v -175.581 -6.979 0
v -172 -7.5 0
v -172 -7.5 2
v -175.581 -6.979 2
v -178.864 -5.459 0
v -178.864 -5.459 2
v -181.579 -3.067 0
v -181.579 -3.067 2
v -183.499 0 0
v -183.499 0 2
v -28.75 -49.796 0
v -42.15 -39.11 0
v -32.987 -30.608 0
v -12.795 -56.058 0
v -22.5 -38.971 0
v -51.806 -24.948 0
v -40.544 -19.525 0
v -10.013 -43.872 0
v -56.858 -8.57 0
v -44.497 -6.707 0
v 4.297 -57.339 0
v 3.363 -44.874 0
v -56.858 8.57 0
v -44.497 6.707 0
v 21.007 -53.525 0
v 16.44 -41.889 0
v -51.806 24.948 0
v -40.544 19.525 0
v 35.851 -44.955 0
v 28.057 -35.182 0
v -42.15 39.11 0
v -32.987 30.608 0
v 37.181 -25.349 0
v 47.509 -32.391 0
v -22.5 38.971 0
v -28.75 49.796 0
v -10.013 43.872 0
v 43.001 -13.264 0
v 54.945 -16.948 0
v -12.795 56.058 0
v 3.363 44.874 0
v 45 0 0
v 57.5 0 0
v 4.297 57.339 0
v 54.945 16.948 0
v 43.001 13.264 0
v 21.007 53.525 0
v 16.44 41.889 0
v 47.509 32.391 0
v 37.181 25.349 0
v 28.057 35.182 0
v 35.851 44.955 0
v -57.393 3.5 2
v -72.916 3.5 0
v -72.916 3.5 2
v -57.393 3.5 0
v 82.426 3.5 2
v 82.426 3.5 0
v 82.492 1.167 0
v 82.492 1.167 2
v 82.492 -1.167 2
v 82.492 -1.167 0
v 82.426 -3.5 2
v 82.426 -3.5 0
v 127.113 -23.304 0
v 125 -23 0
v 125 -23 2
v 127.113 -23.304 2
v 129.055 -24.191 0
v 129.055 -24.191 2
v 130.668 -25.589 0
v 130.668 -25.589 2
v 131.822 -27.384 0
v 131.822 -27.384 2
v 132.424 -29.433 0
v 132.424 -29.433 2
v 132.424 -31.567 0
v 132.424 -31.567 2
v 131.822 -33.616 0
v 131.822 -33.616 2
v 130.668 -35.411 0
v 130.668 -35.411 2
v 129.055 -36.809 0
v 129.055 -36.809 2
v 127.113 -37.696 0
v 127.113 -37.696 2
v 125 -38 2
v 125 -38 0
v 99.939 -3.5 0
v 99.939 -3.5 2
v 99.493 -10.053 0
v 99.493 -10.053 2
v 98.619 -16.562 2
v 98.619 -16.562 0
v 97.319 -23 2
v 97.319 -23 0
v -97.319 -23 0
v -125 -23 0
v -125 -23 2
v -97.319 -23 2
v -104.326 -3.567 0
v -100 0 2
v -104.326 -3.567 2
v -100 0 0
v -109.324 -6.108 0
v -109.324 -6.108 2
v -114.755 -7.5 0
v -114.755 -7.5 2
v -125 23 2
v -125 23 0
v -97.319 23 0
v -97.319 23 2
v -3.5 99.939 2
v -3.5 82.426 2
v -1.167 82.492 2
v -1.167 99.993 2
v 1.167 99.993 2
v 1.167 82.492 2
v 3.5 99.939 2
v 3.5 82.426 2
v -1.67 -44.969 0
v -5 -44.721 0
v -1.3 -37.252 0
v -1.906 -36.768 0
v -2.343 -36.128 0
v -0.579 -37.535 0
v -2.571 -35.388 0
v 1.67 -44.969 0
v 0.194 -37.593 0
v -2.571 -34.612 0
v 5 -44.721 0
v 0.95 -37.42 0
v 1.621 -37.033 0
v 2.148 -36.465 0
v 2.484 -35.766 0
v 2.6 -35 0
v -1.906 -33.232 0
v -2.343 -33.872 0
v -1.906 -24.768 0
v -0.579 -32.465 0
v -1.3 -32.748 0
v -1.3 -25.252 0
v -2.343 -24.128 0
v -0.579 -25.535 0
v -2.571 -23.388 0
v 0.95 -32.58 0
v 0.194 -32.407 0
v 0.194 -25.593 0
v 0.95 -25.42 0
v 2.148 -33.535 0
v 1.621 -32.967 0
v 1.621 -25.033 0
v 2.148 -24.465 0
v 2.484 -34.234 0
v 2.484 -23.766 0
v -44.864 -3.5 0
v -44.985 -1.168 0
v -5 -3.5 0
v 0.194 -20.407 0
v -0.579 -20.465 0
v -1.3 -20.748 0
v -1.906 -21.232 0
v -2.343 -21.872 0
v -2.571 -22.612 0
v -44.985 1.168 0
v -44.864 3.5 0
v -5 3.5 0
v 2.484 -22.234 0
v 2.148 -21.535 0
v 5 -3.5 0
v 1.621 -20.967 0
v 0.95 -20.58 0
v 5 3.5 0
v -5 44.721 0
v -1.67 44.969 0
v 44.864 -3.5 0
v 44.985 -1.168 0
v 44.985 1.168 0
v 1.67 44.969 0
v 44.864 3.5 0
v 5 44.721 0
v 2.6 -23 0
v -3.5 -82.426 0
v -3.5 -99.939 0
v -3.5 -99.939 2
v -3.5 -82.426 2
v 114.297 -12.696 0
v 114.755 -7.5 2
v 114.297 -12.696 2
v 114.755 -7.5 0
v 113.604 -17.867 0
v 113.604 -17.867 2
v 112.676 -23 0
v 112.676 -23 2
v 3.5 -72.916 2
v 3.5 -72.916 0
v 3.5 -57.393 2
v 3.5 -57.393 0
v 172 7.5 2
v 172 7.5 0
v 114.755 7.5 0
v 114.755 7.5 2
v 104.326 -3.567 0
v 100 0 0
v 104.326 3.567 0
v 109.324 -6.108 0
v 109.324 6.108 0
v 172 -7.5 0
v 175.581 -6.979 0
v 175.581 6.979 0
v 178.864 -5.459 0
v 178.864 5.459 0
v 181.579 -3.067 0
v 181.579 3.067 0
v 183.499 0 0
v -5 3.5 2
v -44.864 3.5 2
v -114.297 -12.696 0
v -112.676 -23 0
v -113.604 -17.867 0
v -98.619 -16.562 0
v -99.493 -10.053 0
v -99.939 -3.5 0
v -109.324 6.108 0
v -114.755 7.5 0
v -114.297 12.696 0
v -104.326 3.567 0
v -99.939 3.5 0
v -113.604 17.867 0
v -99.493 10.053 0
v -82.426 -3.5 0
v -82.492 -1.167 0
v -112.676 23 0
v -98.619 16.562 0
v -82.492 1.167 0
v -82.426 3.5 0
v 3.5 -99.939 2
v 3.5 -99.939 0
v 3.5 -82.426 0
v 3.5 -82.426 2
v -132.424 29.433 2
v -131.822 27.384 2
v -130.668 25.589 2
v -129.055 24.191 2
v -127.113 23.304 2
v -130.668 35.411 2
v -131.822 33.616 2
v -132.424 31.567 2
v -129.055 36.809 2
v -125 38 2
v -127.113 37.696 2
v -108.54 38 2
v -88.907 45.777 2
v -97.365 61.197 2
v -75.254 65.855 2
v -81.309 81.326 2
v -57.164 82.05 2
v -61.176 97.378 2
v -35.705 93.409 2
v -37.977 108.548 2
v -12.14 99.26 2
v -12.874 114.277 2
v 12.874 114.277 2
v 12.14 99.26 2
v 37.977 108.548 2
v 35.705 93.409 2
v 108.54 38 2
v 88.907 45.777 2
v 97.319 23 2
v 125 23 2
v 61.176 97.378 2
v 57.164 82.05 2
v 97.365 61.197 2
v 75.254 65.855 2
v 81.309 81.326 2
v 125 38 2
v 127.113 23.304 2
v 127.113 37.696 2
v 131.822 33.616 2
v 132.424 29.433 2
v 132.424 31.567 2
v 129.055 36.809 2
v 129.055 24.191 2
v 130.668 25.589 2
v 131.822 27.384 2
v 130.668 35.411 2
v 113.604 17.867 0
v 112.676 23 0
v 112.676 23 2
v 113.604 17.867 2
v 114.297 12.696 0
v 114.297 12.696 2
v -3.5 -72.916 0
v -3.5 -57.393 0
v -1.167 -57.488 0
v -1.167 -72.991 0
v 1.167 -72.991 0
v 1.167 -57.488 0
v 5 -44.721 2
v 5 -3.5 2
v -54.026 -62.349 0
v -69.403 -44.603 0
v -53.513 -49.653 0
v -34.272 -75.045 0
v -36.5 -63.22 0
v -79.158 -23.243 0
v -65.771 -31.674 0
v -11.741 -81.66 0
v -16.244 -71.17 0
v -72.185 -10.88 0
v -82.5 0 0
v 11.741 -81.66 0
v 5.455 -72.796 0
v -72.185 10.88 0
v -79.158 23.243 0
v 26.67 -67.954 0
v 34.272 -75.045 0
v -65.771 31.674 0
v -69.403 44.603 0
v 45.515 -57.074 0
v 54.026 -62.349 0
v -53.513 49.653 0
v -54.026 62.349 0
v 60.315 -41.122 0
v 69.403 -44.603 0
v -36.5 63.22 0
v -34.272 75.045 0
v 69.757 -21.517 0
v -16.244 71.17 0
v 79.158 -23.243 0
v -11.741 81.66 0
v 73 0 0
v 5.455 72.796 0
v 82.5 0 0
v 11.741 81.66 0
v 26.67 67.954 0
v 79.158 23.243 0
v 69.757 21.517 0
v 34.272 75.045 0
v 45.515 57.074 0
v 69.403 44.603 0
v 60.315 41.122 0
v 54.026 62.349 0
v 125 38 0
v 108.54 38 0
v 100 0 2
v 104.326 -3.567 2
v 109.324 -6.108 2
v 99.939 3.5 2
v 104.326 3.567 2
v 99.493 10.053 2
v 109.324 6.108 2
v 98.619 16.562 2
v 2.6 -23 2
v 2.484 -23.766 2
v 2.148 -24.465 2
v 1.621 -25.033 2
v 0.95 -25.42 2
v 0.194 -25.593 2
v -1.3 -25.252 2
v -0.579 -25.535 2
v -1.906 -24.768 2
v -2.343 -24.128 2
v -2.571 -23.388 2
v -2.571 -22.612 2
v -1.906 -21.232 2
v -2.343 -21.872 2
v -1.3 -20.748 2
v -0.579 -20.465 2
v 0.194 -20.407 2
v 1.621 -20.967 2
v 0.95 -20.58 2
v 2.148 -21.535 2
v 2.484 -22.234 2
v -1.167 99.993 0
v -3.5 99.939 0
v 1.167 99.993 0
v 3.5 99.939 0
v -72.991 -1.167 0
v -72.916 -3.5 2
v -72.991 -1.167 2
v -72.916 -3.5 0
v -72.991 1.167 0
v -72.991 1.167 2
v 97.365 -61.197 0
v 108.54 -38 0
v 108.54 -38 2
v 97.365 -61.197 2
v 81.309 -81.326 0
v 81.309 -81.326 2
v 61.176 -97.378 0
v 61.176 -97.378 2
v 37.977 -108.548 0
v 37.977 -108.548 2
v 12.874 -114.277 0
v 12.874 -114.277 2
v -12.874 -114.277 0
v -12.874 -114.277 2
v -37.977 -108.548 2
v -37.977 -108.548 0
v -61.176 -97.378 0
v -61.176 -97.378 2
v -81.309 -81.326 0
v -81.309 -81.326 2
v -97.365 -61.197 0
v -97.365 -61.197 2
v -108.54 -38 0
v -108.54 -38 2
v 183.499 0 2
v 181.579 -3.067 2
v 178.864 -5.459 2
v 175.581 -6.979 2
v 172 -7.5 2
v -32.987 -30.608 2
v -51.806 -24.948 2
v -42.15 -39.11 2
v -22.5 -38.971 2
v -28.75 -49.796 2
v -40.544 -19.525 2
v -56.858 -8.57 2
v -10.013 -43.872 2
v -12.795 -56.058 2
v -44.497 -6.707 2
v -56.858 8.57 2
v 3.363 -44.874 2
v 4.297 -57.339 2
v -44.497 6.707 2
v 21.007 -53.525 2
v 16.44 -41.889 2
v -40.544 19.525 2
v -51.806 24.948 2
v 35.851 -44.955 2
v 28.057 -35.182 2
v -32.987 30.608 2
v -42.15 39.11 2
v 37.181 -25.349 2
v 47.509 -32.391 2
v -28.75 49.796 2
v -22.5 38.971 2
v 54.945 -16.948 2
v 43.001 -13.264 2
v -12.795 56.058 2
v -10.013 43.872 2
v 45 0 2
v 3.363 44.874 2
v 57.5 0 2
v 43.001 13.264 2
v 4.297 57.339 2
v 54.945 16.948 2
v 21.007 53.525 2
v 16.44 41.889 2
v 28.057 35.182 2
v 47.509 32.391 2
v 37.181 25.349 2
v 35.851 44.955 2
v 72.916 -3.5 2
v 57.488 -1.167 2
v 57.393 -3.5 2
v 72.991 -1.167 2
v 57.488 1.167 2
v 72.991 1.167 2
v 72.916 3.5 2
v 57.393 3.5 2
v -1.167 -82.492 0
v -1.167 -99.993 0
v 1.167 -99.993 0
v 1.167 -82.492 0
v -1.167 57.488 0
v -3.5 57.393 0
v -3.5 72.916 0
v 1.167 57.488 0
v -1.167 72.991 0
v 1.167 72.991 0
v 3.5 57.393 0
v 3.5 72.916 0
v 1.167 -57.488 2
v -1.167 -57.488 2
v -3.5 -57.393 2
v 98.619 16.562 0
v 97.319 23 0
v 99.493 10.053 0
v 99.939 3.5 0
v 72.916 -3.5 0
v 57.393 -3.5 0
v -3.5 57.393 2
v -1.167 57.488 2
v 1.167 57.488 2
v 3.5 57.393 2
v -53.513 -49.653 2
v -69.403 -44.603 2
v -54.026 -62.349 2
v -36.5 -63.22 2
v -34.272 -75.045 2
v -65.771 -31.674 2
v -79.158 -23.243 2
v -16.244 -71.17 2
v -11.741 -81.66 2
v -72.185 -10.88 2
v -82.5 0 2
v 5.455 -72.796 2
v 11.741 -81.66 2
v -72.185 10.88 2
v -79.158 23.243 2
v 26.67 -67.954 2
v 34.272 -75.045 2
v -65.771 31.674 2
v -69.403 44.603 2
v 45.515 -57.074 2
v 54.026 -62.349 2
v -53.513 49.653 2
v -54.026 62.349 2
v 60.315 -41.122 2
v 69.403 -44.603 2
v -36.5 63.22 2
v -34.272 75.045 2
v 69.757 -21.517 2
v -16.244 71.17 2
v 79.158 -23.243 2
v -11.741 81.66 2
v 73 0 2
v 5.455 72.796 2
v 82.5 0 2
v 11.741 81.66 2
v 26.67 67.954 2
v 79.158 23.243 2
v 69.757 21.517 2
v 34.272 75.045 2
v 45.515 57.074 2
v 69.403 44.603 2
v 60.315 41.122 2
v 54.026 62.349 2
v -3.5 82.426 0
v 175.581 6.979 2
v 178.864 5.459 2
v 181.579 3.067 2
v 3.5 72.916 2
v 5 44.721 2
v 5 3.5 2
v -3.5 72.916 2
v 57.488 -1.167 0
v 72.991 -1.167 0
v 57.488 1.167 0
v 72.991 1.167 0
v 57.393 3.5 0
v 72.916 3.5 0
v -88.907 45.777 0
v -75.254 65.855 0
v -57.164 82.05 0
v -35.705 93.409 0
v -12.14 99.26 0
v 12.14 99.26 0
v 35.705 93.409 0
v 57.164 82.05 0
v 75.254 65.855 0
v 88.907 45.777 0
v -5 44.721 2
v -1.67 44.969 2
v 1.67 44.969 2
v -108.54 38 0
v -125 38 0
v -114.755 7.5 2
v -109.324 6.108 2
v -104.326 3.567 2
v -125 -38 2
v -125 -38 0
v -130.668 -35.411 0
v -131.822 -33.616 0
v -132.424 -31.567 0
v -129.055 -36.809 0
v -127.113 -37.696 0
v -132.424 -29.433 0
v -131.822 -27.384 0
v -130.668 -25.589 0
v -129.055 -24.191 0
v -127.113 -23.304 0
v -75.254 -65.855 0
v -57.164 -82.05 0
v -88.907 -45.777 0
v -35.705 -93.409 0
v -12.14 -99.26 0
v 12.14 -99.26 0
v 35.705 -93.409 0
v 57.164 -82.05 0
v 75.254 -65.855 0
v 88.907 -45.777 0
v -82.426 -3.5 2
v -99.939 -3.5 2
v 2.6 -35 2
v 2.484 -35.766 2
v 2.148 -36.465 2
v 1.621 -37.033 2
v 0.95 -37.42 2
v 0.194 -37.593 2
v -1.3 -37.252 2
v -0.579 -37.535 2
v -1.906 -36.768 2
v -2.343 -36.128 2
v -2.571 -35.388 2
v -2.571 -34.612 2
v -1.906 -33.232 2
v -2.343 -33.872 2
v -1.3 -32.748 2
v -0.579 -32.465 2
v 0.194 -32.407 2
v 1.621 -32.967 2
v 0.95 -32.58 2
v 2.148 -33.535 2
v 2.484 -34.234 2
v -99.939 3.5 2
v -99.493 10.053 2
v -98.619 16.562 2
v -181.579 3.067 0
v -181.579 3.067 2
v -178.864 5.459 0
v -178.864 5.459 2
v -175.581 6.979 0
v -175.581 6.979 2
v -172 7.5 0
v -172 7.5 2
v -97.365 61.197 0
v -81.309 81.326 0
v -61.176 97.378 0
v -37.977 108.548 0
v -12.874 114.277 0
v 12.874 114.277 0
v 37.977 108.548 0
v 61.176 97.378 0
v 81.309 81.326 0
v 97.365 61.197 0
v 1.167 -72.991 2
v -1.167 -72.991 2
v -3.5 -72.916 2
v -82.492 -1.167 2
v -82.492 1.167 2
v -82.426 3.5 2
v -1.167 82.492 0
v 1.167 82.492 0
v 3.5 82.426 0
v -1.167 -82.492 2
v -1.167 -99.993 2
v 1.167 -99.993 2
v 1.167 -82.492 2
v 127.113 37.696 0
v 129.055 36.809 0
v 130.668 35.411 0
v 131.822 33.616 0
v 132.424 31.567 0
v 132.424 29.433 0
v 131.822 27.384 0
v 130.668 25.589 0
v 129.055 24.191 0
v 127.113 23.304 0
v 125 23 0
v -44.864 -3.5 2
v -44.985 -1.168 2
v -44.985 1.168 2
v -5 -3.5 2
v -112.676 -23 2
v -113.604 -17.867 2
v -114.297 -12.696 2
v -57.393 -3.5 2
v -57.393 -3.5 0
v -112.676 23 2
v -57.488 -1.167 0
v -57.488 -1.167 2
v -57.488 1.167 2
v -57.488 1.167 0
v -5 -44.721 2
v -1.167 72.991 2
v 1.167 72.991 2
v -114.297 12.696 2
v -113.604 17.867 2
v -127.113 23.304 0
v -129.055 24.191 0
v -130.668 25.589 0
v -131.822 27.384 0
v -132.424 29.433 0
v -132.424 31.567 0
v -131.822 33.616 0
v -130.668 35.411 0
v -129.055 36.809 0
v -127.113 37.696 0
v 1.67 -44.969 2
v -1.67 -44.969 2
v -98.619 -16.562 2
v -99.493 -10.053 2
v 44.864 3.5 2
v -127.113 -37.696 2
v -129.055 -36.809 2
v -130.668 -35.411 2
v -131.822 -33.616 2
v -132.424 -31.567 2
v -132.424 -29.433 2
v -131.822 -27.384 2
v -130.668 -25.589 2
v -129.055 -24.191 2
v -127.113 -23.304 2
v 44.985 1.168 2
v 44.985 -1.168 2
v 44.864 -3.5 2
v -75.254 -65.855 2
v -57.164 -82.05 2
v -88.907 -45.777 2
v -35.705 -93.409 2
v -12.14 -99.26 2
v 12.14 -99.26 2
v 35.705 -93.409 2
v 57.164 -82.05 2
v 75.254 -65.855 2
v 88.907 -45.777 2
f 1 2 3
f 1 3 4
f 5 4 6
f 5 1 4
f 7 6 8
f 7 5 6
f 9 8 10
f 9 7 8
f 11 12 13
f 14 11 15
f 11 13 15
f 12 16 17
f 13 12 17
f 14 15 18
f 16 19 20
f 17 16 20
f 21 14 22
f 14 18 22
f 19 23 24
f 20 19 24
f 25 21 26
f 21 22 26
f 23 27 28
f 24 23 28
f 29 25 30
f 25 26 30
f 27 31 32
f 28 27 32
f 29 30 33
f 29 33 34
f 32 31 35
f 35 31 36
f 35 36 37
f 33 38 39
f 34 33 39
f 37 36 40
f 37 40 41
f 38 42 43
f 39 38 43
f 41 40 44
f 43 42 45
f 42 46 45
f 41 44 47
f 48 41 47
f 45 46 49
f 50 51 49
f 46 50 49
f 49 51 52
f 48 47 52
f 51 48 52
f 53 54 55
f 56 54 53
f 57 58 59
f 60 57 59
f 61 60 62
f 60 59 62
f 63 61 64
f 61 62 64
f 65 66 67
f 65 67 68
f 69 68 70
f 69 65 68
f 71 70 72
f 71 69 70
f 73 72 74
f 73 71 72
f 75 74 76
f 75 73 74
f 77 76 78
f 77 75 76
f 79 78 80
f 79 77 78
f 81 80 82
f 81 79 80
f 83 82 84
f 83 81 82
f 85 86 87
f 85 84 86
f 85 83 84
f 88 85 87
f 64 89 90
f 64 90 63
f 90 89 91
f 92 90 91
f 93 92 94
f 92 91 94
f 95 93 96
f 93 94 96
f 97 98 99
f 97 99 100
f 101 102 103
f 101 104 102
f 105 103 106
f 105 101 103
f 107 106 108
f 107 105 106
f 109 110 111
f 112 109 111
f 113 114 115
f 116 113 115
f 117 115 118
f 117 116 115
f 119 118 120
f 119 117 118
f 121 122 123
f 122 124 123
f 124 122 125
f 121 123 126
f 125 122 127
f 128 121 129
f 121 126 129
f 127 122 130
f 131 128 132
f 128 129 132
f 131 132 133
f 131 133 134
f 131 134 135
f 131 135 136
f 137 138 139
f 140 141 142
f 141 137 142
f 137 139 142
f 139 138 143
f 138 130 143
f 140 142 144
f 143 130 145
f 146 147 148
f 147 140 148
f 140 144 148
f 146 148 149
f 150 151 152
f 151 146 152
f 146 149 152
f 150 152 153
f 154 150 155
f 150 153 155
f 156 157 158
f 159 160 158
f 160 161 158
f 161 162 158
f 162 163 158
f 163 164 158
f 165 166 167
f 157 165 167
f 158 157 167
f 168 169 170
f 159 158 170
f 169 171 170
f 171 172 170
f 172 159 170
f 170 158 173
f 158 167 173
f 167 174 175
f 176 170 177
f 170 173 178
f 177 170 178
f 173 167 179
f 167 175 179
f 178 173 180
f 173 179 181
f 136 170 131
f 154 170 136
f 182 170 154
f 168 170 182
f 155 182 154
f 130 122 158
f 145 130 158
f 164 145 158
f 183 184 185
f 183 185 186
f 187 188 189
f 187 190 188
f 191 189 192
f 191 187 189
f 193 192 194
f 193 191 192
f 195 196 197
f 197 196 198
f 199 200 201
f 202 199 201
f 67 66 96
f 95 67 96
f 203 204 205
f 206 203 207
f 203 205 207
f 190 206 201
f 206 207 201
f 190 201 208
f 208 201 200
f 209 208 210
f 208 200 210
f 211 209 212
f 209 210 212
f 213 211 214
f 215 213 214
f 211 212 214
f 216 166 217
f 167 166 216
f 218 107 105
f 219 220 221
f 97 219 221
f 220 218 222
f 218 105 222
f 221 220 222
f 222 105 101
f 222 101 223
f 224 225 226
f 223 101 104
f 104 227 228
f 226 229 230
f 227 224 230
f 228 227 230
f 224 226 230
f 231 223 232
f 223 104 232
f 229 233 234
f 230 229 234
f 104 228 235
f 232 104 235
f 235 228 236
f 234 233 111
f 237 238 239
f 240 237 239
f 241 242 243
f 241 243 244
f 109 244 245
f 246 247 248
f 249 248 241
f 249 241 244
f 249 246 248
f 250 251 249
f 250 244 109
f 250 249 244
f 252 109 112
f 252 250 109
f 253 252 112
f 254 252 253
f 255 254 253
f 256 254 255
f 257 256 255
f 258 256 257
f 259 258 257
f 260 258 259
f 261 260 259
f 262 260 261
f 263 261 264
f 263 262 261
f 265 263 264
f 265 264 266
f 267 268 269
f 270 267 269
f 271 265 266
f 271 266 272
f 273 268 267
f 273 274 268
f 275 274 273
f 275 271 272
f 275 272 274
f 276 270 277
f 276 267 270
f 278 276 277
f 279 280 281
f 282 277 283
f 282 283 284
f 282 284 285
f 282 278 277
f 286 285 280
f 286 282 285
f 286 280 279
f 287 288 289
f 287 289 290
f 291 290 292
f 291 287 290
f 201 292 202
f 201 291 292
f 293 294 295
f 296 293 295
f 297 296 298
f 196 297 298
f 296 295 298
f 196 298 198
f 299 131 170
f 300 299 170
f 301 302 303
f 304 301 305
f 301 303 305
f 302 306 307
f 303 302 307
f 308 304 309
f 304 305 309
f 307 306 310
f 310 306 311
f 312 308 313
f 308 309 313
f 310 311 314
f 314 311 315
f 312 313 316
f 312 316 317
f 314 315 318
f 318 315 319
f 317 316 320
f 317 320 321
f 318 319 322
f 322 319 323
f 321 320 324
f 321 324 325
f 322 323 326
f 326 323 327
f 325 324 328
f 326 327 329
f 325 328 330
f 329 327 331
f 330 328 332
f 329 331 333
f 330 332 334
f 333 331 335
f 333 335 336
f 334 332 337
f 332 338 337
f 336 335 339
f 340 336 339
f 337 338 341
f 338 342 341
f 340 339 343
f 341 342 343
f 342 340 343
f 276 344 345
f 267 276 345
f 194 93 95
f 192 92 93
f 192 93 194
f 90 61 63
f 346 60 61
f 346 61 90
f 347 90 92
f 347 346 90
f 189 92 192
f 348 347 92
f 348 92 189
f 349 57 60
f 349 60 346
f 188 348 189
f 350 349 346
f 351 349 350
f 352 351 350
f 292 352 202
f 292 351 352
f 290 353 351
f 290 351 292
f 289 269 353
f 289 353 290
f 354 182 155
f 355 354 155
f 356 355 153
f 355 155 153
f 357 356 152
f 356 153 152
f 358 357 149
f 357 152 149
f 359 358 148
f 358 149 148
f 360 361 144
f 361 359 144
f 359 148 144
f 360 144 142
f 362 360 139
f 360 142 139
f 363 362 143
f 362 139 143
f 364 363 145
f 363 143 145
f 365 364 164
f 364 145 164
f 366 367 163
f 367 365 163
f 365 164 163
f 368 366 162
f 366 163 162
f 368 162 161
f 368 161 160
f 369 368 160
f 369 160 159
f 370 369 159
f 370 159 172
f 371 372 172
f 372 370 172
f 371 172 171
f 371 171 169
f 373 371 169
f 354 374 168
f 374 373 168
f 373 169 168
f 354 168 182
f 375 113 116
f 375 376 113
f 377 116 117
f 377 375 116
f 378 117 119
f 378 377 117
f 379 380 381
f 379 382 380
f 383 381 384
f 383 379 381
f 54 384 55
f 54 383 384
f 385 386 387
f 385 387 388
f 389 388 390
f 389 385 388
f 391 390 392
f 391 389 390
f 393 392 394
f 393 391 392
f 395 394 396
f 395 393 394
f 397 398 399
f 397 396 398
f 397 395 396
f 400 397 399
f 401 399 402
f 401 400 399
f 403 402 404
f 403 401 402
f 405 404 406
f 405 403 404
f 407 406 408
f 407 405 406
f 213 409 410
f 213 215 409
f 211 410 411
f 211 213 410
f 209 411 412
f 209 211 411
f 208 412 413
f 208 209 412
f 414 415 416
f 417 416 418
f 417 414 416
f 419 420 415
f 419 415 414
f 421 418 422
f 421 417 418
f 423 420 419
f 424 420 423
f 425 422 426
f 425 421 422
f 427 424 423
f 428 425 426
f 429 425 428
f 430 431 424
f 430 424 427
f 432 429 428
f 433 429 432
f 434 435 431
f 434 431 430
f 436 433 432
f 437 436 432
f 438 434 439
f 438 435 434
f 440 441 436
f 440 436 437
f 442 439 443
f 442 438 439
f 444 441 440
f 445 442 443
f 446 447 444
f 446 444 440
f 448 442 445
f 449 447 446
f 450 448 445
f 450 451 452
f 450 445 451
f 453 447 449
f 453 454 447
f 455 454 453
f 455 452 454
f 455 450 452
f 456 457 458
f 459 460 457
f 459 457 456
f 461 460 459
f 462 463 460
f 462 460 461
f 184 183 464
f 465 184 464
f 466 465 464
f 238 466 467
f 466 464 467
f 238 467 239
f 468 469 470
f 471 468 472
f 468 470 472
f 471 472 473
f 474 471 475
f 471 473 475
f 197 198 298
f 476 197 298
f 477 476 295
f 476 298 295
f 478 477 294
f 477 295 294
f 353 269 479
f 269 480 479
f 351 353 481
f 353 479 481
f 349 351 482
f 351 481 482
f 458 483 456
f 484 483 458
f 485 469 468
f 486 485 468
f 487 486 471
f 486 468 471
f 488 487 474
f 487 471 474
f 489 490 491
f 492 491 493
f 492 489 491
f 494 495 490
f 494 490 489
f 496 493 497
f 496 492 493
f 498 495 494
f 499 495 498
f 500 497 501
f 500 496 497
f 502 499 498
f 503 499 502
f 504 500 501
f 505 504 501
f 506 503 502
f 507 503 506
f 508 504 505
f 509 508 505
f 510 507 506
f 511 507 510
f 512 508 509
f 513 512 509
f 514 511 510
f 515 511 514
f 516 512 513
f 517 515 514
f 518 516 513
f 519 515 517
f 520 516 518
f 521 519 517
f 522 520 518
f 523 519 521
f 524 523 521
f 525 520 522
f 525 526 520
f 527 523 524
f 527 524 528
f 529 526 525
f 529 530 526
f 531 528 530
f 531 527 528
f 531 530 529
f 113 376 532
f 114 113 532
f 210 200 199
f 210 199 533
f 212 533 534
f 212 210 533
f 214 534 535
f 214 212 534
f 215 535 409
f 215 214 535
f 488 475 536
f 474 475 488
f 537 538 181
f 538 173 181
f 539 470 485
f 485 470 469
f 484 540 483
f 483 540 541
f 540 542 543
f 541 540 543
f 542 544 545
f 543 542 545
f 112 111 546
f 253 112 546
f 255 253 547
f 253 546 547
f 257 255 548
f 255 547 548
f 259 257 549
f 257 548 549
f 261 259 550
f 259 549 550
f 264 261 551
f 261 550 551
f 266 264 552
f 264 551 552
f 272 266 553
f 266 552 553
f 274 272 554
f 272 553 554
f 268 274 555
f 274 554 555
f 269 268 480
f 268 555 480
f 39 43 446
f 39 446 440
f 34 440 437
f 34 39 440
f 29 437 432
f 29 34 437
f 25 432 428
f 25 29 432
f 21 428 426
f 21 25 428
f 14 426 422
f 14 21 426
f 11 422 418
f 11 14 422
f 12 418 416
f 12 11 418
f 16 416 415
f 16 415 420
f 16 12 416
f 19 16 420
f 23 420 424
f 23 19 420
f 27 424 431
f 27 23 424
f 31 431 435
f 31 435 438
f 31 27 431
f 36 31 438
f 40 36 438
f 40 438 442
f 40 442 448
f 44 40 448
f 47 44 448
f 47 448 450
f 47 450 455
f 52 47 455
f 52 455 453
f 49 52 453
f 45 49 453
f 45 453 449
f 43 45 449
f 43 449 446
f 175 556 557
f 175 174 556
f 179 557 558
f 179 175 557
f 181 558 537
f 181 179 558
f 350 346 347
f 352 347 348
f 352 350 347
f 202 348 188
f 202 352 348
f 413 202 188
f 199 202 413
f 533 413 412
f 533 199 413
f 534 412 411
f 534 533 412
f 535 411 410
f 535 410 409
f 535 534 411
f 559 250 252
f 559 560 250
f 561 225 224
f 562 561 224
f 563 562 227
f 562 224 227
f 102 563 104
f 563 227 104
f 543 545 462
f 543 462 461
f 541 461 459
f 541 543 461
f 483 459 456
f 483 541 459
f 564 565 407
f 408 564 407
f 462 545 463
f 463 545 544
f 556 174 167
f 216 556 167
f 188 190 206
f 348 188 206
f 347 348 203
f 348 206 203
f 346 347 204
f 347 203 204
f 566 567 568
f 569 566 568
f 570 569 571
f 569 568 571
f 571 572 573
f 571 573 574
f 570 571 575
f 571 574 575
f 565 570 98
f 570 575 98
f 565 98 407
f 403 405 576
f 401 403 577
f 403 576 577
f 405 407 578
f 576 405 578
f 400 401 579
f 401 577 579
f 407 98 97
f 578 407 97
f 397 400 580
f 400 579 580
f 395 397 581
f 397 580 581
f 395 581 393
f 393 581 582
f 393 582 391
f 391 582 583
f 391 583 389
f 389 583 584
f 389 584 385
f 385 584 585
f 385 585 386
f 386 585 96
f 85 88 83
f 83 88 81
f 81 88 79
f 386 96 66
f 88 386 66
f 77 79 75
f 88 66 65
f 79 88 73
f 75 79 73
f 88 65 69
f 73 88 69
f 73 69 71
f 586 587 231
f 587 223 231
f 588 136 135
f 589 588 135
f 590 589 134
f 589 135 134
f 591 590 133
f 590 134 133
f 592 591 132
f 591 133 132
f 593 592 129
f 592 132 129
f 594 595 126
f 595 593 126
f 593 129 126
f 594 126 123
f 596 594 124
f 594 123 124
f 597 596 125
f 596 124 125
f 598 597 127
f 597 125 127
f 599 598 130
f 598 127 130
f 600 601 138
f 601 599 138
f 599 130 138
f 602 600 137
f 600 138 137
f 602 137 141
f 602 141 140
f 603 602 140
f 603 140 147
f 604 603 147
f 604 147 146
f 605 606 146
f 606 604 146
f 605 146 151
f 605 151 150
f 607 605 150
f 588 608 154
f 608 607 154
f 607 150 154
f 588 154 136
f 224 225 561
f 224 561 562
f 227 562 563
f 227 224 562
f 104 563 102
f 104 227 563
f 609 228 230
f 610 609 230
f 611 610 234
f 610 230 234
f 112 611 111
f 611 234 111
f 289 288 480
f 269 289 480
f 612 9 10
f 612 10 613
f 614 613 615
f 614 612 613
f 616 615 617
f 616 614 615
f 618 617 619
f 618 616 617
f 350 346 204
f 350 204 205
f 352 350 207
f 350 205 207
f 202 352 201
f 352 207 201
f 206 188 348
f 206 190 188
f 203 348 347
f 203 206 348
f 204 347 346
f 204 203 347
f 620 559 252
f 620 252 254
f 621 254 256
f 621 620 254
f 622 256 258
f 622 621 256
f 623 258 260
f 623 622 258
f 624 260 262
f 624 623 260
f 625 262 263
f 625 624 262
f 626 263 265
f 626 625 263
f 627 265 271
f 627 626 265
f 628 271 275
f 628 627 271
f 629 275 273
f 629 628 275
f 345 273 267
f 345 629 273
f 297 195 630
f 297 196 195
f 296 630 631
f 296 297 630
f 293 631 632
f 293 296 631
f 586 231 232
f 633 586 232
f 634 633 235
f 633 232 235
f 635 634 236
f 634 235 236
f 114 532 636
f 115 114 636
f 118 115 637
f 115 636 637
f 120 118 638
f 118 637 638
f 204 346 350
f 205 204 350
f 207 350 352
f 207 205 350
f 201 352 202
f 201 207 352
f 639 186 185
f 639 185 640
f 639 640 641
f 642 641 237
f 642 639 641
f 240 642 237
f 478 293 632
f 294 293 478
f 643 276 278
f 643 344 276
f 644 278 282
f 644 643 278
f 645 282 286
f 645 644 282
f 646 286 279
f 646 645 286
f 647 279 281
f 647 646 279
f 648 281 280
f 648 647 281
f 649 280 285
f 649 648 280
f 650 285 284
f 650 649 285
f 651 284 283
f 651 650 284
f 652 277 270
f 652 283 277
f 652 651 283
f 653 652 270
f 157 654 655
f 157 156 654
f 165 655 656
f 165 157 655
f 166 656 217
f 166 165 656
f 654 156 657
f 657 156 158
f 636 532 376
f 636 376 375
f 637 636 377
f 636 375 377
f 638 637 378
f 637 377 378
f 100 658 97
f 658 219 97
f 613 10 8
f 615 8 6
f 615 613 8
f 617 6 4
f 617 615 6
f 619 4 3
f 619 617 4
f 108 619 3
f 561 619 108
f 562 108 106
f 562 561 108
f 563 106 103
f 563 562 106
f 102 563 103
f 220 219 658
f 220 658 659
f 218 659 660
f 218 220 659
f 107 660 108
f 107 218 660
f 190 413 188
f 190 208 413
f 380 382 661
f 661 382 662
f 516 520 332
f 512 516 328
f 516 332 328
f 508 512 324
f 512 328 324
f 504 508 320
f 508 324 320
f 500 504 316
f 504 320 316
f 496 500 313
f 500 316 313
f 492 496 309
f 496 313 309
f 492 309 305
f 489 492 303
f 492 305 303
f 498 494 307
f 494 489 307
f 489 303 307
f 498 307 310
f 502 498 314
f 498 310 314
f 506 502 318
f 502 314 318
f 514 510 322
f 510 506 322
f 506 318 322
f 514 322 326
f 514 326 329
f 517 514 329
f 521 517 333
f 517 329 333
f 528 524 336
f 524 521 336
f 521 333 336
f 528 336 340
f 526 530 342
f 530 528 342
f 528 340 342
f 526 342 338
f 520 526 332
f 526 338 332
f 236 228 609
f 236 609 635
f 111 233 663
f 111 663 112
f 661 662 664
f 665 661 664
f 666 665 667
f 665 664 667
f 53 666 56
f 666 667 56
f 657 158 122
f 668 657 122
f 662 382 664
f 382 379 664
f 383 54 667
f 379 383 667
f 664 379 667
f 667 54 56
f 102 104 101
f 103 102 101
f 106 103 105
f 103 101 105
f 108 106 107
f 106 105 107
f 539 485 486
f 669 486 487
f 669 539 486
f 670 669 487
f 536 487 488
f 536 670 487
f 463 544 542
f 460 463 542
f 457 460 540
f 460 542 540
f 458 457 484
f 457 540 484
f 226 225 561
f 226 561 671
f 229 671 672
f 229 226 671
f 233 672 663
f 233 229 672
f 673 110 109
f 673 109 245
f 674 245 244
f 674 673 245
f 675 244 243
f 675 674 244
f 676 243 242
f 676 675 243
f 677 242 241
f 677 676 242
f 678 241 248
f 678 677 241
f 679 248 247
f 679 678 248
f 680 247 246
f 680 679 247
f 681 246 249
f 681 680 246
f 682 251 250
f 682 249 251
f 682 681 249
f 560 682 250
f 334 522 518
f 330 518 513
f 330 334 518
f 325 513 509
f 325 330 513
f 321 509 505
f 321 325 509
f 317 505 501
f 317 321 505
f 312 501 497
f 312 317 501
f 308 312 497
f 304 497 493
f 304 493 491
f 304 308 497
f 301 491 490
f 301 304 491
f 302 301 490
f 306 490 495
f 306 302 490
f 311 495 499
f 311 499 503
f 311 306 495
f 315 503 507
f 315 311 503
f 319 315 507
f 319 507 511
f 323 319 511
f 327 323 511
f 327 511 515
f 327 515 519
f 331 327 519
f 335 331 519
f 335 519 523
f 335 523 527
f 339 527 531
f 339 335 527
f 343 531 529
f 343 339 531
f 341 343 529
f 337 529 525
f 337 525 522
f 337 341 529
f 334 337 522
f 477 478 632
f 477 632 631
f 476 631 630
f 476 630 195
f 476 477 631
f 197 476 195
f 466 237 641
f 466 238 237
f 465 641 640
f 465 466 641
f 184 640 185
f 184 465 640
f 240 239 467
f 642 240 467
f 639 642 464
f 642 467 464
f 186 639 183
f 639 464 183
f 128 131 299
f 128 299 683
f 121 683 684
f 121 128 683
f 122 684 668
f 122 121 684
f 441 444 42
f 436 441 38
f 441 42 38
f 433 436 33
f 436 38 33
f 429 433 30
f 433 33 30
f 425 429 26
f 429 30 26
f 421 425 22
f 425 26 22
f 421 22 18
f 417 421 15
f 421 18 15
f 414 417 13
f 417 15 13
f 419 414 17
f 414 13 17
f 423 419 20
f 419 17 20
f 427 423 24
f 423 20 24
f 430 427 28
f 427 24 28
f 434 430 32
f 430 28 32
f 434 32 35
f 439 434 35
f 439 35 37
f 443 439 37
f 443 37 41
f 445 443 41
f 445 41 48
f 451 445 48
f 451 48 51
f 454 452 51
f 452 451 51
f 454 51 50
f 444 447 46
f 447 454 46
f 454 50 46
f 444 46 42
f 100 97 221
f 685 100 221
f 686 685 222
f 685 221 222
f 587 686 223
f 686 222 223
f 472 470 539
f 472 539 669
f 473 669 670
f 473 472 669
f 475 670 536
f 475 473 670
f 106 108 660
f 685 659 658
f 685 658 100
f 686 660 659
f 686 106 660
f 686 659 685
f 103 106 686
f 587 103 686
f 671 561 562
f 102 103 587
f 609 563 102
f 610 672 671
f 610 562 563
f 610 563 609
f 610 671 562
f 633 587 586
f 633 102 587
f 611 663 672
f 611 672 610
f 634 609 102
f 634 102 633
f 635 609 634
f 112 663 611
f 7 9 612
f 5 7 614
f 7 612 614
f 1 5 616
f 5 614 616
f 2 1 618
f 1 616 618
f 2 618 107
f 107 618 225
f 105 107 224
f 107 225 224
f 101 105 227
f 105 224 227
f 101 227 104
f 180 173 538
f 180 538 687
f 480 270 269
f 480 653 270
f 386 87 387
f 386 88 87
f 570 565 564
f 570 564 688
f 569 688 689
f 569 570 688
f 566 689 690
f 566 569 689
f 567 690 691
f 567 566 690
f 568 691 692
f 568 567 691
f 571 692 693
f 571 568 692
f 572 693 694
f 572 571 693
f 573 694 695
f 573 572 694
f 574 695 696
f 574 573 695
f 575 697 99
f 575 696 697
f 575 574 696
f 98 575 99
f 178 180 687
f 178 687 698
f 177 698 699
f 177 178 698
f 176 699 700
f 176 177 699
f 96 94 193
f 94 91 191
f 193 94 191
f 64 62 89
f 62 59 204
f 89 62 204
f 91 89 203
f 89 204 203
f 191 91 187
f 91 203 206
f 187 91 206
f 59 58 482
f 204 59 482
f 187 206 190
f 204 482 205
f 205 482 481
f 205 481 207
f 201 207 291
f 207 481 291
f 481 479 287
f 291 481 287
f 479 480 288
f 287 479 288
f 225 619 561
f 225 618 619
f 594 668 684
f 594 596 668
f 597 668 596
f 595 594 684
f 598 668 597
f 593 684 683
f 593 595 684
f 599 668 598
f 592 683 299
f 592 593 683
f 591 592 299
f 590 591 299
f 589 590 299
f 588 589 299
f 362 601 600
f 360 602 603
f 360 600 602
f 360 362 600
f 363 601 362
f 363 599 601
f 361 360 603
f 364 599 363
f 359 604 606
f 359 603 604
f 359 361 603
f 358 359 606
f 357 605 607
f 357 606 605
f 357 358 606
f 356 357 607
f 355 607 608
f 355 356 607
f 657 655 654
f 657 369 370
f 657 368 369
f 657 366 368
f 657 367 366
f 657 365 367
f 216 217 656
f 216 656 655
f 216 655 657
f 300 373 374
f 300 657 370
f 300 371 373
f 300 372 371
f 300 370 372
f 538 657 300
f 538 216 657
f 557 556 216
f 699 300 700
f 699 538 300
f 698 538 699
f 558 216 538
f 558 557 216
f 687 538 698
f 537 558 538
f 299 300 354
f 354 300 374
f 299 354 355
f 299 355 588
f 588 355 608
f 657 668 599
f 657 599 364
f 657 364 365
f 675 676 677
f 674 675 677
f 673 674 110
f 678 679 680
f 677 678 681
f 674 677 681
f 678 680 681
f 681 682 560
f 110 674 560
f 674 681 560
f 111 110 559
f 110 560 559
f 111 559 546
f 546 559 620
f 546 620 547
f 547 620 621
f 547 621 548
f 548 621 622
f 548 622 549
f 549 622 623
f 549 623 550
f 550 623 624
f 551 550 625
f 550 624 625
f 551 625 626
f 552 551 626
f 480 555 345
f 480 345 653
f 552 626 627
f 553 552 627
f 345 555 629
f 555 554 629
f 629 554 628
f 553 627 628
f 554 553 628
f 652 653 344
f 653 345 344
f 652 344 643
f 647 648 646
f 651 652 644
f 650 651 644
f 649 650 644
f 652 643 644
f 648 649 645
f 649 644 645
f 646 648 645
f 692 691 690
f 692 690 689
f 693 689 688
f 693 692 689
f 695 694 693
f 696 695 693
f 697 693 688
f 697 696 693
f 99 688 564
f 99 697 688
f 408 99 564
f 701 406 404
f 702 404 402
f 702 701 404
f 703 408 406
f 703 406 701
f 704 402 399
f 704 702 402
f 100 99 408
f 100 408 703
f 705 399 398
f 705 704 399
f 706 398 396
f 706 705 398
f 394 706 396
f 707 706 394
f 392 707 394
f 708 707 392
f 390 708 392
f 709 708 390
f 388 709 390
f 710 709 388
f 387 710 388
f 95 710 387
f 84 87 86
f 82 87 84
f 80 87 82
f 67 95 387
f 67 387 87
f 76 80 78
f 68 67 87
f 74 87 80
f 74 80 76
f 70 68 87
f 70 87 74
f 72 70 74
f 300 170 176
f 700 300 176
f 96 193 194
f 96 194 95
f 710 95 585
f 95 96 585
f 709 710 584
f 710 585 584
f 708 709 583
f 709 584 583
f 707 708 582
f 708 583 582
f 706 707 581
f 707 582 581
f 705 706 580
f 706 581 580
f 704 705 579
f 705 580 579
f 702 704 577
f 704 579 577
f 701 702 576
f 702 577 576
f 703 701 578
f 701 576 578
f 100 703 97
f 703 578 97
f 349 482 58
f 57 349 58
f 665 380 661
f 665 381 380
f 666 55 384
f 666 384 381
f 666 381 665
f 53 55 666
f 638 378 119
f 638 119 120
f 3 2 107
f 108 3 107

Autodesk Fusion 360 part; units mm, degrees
sketch "スケッチ1" plane through (0, 0, 0) normal (0, 0, 1) x (1, 0, 0)
  circle A0 centre (0, 0) radius 100
  circle A1 centre (0, 0) radius 82.5
  circle A2 centre (0, 0) radius 73
  circle A3 centre (0, 0) radius 57.5
  line L0 (0, 0) -> (0, 115) construction
  line L1 (0, 23) -> (-125, 23) construction
  line L2 (0, 0) -> (115, 0) construction
  line L3 (0, 38) -> (-125, 38) construction
  line L4 (-125, 23) -> (-125, 38) construction
  arc A4 (-125, 38) -> (-125, 23) centre (-125, 30.5) ccw
  line L5 (-125, 38) -> (-108.5403, 38)
  line L6 (-125, 23) -> (-112.6765, 23)
  line L7 (0, 7.5) -> (-172, 7.5) construction
  line L8 (-172, 7.5) -> (-114.7552, 7.5)
  line L9 (0, 0) -> (-190, 0) construction
  arc A5 (-172, 7.5) -> (-183.4987, 0) centre (-172, -5.0647) ccw
  line L10 (-3.5, 99.9387) -> (-3.5, 82.4257)
  line L11 (-3.5, 72.916) -> (-3.5, 57.3934)
  line L12 (3.5, 99.9387) -> (3.5, 82.4257)
  line L13 (3.5, 72.916) -> (3.5, 57.3934)
  arc A6 (-183.4987, 0) -> (-172, -7.5) centre (-172, 5.0647) ccw
  line L14 (-172, -7.5) -> (-114.7552, -7.5)
  line L15 (-125, -38) -> (-108.5403, -38)
  arc A7 (-125, -23) -> (-125, -38) centre (-125, -30.5) ccw
  line L16 (-125, -23) -> (-112.6765, -23)
  arc A8 (125, 23) -> (125, 38) centre (125, 30.5) ccw
  line L17 (125, 38) -> (108.5403, 38)
  line L18 (125, 23) -> (112.6765, 23)
  line L19 (172, 7.5) -> (114.7552, 7.5)
  arc A9 (183.4987, 0) -> (172, 7.5) centre (172, -5.0647) ccw
  arc A10 (172, -7.5) -> (183.4987, 0) centre (172, 5.0647) ccw
  line L20 (172, -7.5) -> (114.7552, -7.5)
  line L21 (125, -23) -> (112.6765, -23)
  arc A11 (125, -38) -> (125, -23) centre (125, -30.5) ccw
  line L22 (125, -38) -> (108.5403, -38)
  arc A12 (-112.6765, 23) -> (-114.7552, 7.5) centre (0, 0) ccw
  arc A13 (-114.7552, -7.5) -> (-112.6765, -23) centre (0, 0) ccw
  arc A14 (-108.5403, -38) -> (108.5403, -38) centre (0, 0) ccw
  arc A15 (112.6765, -23) -> (114.7552, -7.5) centre (0, 0) ccw
  arc A16 (114.7552, 7.5) -> (112.6765, 23) centre (0, 0) ccw
  arc A17 (108.5403, 38) -> (-108.5403, 38) centre (0, 0) ccw
  line L23 (-72.916, 3.5) -> (-57.3934, 3.5)
  line L24 (-72.916, -3.5) -> (-57.3934, -3.5)
  line L25 (-99.9387, 3.5) -> (-82.4257, 3.5)
  line L26 (-99.9387, -3.5) -> (-82.4257, -3.5)
  line L27 (-3.5, -72.916) -> (-3.5, -57.3934)
  line L28 (3.5, -72.916) -> (3.5, -57.3934)
  line L29 (-3.5, -99.9387) -> (-3.5, -82.4257)
  line L30 (3.5, -99.9387) -> (3.5, -82.4257)
  line L31 (72.916, -3.5) -> (57.3934, -3.5)
  line L32 (72.916, 3.5) -> (57.3934, 3.5)
  line L33 (99.9387, -3.5) -> (82.4257, -3.5)
  line L34 (99.9387, 3.5) -> (82.4257, 3.5)
  circle A18 centre (0, 0) radius 45
  circle A19 centre (0, -35) radius 2.6
  circle A20 centre (0, -23) radius 2.6
  line L35 (5, -44.7214) -> (5, -3.5)
  line L36 (5, 3.5) -> (5, 44.7214)
  line L37 (-5, 44.7214) -> (-5, 3.5)
  line L38 (-5, -3.5) -> (-5, -44.7214)
  line L39 (-44.8637, 3.5) -> (-5, 3.5)
  line L40 (5, 3.5) -> (44.8637, 3.5)
  line L41 (-44.8637, -3.5) -> (-5, -3.5)
  line L42 (5, -3.5) -> (44.8637, -3.5)
  arc A21 (-100, 0) -> (-114.7552, 7.5) centre (-118.3609, -17.858) ccw
  arc A22 (-114.7552, -7.5) -> (-100, 0) centre (-118.3609, 17.858) ccw
  line L43 (-112.6765, 23) -> (-97.3191, 23)
  line L44 (-112.6765, -23) -> (-97.3191, -23)
  line L45 (112.6765, 23) -> (97.3191, 23)
  arc A23 (114.7552, 7.5) -> (100, 0) centre (118.3609, -17.858) ccw
  arc A24 (100, 0) -> (114.7552, -7.5) centre (118.3609, 17.858) ccw
  line L46 (112.6765, -23) -> (97.3191, -23)
  dimension "d1" = 230
  dimension "d2" = 200
  dimension "d3" = 165
  dimension "d4" = 146
  dimension "d5" = 115
  dimension "d7" = 23
  dimension "d8" = 125
  dimension "d9" = 125
  dimension "d10" = 15
  dimension "d11" = 172
  dimension "d12" = 7
  dimension "d14" = 360
  dimension "d15" = 90
  dimension "d16" = 10
  dimension "d17" = 5.2
  dimension "d18" = 5.2
  dimension "d19" = 7.5
extrude "押し出し1" add sketch "スケッチ1" along normal blind 2 contours L19 A9 A10 L20 A23 A24 | A0 A4 L5 L6 A8 L17 L18 A17 L43 L45 | A1 | A0 L15 A7 L16 L21 A11 L22 A14 L44 L46 | L8 A5 A6 L14 A21 A22 | A3 makes body 1 at (-133.8368, -2.5, 0) makes body 2 at (-110.2865, 28, 2) makes body 3 at (110.2865, -28, 2) makes body 4 at (-49.9173, 18.3869, 0) makes body 5 at (-77.5326, -15.8311, 0) makes body 6 at (133.8368, 2.5, 0)
extrude "押し出し2" add sketch "スケッチ1" along normal blind 2 separate body contours A0 A1 L33 L34 | A0 A15 A24 L46 | A0 A16 L45 A23 | A0 A1 L10 L12 | A0 A1 L29 L30 | A0 A12 A21 L43 | A0 A1 L25 L26 | A0 A13 A22 L44 | A2 A3 L31 L32 | A2 A3 L11 L13 | A2 A3 L27 L28 | A2 A3 L23 L24 | A18 L35 L36 L37 L38 L39 L40 L41 L42 makes body 7 at (2.7223, -88.2854, 0) makes body 8 at (0.5566, 17.323, 2) makes body 9 at (-62.5992, 2.7224, 0) makes body 10 at (-2.7224, -62.5992, 0) makes body 11 at (62.5992, -2.7224, 0) makes body 12 at (2.7224, 62.5992, 0) makes body 13 at (-102.8715, -20.854, 0) makes body 14 at (2.7223, 88.2854, 0) makes body 15 at (102.8715, 20.854, 0)
